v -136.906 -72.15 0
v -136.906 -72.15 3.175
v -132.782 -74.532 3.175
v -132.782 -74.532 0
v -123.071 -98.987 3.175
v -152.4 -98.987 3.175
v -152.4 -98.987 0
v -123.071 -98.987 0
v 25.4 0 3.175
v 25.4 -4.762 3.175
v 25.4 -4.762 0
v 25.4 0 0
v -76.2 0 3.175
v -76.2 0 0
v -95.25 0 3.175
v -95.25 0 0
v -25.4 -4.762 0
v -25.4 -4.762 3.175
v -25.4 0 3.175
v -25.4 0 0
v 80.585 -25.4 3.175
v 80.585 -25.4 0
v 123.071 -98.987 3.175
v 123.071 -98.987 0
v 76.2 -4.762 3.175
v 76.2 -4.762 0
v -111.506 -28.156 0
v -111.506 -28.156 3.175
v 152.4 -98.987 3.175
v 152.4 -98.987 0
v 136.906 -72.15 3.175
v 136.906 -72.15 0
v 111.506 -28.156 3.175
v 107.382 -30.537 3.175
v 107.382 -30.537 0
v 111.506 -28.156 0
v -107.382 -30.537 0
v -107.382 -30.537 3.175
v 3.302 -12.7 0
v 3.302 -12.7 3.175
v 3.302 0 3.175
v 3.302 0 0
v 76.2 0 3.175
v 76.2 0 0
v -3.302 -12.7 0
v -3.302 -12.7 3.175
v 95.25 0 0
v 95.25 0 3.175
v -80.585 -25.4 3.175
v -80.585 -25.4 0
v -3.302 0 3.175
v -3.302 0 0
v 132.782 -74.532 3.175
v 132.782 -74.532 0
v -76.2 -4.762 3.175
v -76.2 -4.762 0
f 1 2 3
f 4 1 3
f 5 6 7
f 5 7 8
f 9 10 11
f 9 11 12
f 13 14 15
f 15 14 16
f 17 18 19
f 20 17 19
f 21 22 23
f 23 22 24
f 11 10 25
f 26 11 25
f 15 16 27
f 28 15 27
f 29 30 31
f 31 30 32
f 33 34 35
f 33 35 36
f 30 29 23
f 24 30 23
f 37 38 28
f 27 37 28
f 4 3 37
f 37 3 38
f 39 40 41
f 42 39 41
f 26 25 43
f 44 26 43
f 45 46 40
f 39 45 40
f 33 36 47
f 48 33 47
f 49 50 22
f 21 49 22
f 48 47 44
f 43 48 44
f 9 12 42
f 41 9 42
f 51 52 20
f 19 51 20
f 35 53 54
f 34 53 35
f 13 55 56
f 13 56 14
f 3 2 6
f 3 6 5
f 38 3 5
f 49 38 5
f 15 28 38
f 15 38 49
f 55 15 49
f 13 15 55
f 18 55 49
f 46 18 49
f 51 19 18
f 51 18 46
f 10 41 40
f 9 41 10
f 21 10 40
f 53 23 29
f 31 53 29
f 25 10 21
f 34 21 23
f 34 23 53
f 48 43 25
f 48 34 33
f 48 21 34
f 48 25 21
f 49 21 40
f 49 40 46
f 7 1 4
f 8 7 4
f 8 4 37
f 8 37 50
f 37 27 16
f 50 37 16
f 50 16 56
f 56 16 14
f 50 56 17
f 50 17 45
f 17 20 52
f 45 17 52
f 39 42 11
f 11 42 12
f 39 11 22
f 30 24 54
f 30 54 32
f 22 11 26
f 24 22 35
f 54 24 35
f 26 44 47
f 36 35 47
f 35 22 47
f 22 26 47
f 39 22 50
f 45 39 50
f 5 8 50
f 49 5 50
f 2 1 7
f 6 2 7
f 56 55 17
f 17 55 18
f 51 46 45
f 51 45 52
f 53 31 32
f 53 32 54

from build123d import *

# Parameters (mm, degrees)
BOSS_EXTRUDE1_DEPTH = 3.175
SKETCH2_W           = 6.604
SKETCH2_H           = 12.7
SKETCH2_W_2         = 50.8
SKETCH2_H_2         = 4.7625
CUT_EXTRUDE1_DEPTH  = 192.297317003


with BuildPart() as part:
    # Sketch1 → Boss-Extrude1 (new body)
    with BuildSketch(Plane.XY):
        Polygon((95.25, 0), (-95.25, 0), (-153.67, -101.186408178), (-131.672954744, -113.886408178), (-80.585303163, -25.4), (80.585303163, -25.4), (131.672954744, -113.886408178), (153.67, -101.186408178), align=None)
    extrude(amount=BOSS_EXTRUDE1_DEPTH)

    # Sketch2 → Cut-Extrude1 (cut, through all)
    with BuildSketch(Plane.XY.offset(3.175)):
        with Locations((0, -6.35)):
            Rectangle(SKETCH2_W, SKETCH2_H)
        Polygon((-111.506, -28.156217928), (-136.906, -72.15030844), (-132.781554014, -74.53155844), (-107.381554014, -30.537467928), align=None)
        with Locations((-50.8, -2.38125)):
            Rectangle(SKETCH2_W_2, SKETCH2_H_2)
        with Locations((50.8, -2.38125)):
            Rectangle(SKETCH2_W_2, SKETCH2_H_2)
        Polygon((107.381554014, -30.537467928), (111.506, -28.156217928), (136.906, -72.15030844), (132.781554014, -74.53155844), align=None)
        Polygon((-152.4, -98.986703653), (-123.070606325, -98.986703653), (-131.672954744, -113.886408178), (-153.67, -101.186408178), align=None)
        Polygon((153.67, -101.186408178), (152.4, -98.986703653), (123.070606325, -98.986703653), (131.672954744, -113.886408178), align=None)
    extrude(amount=-CUT_EXTRUDE1_DEPTH, mode=Mode.SUBTRACT)


solid = part.part
